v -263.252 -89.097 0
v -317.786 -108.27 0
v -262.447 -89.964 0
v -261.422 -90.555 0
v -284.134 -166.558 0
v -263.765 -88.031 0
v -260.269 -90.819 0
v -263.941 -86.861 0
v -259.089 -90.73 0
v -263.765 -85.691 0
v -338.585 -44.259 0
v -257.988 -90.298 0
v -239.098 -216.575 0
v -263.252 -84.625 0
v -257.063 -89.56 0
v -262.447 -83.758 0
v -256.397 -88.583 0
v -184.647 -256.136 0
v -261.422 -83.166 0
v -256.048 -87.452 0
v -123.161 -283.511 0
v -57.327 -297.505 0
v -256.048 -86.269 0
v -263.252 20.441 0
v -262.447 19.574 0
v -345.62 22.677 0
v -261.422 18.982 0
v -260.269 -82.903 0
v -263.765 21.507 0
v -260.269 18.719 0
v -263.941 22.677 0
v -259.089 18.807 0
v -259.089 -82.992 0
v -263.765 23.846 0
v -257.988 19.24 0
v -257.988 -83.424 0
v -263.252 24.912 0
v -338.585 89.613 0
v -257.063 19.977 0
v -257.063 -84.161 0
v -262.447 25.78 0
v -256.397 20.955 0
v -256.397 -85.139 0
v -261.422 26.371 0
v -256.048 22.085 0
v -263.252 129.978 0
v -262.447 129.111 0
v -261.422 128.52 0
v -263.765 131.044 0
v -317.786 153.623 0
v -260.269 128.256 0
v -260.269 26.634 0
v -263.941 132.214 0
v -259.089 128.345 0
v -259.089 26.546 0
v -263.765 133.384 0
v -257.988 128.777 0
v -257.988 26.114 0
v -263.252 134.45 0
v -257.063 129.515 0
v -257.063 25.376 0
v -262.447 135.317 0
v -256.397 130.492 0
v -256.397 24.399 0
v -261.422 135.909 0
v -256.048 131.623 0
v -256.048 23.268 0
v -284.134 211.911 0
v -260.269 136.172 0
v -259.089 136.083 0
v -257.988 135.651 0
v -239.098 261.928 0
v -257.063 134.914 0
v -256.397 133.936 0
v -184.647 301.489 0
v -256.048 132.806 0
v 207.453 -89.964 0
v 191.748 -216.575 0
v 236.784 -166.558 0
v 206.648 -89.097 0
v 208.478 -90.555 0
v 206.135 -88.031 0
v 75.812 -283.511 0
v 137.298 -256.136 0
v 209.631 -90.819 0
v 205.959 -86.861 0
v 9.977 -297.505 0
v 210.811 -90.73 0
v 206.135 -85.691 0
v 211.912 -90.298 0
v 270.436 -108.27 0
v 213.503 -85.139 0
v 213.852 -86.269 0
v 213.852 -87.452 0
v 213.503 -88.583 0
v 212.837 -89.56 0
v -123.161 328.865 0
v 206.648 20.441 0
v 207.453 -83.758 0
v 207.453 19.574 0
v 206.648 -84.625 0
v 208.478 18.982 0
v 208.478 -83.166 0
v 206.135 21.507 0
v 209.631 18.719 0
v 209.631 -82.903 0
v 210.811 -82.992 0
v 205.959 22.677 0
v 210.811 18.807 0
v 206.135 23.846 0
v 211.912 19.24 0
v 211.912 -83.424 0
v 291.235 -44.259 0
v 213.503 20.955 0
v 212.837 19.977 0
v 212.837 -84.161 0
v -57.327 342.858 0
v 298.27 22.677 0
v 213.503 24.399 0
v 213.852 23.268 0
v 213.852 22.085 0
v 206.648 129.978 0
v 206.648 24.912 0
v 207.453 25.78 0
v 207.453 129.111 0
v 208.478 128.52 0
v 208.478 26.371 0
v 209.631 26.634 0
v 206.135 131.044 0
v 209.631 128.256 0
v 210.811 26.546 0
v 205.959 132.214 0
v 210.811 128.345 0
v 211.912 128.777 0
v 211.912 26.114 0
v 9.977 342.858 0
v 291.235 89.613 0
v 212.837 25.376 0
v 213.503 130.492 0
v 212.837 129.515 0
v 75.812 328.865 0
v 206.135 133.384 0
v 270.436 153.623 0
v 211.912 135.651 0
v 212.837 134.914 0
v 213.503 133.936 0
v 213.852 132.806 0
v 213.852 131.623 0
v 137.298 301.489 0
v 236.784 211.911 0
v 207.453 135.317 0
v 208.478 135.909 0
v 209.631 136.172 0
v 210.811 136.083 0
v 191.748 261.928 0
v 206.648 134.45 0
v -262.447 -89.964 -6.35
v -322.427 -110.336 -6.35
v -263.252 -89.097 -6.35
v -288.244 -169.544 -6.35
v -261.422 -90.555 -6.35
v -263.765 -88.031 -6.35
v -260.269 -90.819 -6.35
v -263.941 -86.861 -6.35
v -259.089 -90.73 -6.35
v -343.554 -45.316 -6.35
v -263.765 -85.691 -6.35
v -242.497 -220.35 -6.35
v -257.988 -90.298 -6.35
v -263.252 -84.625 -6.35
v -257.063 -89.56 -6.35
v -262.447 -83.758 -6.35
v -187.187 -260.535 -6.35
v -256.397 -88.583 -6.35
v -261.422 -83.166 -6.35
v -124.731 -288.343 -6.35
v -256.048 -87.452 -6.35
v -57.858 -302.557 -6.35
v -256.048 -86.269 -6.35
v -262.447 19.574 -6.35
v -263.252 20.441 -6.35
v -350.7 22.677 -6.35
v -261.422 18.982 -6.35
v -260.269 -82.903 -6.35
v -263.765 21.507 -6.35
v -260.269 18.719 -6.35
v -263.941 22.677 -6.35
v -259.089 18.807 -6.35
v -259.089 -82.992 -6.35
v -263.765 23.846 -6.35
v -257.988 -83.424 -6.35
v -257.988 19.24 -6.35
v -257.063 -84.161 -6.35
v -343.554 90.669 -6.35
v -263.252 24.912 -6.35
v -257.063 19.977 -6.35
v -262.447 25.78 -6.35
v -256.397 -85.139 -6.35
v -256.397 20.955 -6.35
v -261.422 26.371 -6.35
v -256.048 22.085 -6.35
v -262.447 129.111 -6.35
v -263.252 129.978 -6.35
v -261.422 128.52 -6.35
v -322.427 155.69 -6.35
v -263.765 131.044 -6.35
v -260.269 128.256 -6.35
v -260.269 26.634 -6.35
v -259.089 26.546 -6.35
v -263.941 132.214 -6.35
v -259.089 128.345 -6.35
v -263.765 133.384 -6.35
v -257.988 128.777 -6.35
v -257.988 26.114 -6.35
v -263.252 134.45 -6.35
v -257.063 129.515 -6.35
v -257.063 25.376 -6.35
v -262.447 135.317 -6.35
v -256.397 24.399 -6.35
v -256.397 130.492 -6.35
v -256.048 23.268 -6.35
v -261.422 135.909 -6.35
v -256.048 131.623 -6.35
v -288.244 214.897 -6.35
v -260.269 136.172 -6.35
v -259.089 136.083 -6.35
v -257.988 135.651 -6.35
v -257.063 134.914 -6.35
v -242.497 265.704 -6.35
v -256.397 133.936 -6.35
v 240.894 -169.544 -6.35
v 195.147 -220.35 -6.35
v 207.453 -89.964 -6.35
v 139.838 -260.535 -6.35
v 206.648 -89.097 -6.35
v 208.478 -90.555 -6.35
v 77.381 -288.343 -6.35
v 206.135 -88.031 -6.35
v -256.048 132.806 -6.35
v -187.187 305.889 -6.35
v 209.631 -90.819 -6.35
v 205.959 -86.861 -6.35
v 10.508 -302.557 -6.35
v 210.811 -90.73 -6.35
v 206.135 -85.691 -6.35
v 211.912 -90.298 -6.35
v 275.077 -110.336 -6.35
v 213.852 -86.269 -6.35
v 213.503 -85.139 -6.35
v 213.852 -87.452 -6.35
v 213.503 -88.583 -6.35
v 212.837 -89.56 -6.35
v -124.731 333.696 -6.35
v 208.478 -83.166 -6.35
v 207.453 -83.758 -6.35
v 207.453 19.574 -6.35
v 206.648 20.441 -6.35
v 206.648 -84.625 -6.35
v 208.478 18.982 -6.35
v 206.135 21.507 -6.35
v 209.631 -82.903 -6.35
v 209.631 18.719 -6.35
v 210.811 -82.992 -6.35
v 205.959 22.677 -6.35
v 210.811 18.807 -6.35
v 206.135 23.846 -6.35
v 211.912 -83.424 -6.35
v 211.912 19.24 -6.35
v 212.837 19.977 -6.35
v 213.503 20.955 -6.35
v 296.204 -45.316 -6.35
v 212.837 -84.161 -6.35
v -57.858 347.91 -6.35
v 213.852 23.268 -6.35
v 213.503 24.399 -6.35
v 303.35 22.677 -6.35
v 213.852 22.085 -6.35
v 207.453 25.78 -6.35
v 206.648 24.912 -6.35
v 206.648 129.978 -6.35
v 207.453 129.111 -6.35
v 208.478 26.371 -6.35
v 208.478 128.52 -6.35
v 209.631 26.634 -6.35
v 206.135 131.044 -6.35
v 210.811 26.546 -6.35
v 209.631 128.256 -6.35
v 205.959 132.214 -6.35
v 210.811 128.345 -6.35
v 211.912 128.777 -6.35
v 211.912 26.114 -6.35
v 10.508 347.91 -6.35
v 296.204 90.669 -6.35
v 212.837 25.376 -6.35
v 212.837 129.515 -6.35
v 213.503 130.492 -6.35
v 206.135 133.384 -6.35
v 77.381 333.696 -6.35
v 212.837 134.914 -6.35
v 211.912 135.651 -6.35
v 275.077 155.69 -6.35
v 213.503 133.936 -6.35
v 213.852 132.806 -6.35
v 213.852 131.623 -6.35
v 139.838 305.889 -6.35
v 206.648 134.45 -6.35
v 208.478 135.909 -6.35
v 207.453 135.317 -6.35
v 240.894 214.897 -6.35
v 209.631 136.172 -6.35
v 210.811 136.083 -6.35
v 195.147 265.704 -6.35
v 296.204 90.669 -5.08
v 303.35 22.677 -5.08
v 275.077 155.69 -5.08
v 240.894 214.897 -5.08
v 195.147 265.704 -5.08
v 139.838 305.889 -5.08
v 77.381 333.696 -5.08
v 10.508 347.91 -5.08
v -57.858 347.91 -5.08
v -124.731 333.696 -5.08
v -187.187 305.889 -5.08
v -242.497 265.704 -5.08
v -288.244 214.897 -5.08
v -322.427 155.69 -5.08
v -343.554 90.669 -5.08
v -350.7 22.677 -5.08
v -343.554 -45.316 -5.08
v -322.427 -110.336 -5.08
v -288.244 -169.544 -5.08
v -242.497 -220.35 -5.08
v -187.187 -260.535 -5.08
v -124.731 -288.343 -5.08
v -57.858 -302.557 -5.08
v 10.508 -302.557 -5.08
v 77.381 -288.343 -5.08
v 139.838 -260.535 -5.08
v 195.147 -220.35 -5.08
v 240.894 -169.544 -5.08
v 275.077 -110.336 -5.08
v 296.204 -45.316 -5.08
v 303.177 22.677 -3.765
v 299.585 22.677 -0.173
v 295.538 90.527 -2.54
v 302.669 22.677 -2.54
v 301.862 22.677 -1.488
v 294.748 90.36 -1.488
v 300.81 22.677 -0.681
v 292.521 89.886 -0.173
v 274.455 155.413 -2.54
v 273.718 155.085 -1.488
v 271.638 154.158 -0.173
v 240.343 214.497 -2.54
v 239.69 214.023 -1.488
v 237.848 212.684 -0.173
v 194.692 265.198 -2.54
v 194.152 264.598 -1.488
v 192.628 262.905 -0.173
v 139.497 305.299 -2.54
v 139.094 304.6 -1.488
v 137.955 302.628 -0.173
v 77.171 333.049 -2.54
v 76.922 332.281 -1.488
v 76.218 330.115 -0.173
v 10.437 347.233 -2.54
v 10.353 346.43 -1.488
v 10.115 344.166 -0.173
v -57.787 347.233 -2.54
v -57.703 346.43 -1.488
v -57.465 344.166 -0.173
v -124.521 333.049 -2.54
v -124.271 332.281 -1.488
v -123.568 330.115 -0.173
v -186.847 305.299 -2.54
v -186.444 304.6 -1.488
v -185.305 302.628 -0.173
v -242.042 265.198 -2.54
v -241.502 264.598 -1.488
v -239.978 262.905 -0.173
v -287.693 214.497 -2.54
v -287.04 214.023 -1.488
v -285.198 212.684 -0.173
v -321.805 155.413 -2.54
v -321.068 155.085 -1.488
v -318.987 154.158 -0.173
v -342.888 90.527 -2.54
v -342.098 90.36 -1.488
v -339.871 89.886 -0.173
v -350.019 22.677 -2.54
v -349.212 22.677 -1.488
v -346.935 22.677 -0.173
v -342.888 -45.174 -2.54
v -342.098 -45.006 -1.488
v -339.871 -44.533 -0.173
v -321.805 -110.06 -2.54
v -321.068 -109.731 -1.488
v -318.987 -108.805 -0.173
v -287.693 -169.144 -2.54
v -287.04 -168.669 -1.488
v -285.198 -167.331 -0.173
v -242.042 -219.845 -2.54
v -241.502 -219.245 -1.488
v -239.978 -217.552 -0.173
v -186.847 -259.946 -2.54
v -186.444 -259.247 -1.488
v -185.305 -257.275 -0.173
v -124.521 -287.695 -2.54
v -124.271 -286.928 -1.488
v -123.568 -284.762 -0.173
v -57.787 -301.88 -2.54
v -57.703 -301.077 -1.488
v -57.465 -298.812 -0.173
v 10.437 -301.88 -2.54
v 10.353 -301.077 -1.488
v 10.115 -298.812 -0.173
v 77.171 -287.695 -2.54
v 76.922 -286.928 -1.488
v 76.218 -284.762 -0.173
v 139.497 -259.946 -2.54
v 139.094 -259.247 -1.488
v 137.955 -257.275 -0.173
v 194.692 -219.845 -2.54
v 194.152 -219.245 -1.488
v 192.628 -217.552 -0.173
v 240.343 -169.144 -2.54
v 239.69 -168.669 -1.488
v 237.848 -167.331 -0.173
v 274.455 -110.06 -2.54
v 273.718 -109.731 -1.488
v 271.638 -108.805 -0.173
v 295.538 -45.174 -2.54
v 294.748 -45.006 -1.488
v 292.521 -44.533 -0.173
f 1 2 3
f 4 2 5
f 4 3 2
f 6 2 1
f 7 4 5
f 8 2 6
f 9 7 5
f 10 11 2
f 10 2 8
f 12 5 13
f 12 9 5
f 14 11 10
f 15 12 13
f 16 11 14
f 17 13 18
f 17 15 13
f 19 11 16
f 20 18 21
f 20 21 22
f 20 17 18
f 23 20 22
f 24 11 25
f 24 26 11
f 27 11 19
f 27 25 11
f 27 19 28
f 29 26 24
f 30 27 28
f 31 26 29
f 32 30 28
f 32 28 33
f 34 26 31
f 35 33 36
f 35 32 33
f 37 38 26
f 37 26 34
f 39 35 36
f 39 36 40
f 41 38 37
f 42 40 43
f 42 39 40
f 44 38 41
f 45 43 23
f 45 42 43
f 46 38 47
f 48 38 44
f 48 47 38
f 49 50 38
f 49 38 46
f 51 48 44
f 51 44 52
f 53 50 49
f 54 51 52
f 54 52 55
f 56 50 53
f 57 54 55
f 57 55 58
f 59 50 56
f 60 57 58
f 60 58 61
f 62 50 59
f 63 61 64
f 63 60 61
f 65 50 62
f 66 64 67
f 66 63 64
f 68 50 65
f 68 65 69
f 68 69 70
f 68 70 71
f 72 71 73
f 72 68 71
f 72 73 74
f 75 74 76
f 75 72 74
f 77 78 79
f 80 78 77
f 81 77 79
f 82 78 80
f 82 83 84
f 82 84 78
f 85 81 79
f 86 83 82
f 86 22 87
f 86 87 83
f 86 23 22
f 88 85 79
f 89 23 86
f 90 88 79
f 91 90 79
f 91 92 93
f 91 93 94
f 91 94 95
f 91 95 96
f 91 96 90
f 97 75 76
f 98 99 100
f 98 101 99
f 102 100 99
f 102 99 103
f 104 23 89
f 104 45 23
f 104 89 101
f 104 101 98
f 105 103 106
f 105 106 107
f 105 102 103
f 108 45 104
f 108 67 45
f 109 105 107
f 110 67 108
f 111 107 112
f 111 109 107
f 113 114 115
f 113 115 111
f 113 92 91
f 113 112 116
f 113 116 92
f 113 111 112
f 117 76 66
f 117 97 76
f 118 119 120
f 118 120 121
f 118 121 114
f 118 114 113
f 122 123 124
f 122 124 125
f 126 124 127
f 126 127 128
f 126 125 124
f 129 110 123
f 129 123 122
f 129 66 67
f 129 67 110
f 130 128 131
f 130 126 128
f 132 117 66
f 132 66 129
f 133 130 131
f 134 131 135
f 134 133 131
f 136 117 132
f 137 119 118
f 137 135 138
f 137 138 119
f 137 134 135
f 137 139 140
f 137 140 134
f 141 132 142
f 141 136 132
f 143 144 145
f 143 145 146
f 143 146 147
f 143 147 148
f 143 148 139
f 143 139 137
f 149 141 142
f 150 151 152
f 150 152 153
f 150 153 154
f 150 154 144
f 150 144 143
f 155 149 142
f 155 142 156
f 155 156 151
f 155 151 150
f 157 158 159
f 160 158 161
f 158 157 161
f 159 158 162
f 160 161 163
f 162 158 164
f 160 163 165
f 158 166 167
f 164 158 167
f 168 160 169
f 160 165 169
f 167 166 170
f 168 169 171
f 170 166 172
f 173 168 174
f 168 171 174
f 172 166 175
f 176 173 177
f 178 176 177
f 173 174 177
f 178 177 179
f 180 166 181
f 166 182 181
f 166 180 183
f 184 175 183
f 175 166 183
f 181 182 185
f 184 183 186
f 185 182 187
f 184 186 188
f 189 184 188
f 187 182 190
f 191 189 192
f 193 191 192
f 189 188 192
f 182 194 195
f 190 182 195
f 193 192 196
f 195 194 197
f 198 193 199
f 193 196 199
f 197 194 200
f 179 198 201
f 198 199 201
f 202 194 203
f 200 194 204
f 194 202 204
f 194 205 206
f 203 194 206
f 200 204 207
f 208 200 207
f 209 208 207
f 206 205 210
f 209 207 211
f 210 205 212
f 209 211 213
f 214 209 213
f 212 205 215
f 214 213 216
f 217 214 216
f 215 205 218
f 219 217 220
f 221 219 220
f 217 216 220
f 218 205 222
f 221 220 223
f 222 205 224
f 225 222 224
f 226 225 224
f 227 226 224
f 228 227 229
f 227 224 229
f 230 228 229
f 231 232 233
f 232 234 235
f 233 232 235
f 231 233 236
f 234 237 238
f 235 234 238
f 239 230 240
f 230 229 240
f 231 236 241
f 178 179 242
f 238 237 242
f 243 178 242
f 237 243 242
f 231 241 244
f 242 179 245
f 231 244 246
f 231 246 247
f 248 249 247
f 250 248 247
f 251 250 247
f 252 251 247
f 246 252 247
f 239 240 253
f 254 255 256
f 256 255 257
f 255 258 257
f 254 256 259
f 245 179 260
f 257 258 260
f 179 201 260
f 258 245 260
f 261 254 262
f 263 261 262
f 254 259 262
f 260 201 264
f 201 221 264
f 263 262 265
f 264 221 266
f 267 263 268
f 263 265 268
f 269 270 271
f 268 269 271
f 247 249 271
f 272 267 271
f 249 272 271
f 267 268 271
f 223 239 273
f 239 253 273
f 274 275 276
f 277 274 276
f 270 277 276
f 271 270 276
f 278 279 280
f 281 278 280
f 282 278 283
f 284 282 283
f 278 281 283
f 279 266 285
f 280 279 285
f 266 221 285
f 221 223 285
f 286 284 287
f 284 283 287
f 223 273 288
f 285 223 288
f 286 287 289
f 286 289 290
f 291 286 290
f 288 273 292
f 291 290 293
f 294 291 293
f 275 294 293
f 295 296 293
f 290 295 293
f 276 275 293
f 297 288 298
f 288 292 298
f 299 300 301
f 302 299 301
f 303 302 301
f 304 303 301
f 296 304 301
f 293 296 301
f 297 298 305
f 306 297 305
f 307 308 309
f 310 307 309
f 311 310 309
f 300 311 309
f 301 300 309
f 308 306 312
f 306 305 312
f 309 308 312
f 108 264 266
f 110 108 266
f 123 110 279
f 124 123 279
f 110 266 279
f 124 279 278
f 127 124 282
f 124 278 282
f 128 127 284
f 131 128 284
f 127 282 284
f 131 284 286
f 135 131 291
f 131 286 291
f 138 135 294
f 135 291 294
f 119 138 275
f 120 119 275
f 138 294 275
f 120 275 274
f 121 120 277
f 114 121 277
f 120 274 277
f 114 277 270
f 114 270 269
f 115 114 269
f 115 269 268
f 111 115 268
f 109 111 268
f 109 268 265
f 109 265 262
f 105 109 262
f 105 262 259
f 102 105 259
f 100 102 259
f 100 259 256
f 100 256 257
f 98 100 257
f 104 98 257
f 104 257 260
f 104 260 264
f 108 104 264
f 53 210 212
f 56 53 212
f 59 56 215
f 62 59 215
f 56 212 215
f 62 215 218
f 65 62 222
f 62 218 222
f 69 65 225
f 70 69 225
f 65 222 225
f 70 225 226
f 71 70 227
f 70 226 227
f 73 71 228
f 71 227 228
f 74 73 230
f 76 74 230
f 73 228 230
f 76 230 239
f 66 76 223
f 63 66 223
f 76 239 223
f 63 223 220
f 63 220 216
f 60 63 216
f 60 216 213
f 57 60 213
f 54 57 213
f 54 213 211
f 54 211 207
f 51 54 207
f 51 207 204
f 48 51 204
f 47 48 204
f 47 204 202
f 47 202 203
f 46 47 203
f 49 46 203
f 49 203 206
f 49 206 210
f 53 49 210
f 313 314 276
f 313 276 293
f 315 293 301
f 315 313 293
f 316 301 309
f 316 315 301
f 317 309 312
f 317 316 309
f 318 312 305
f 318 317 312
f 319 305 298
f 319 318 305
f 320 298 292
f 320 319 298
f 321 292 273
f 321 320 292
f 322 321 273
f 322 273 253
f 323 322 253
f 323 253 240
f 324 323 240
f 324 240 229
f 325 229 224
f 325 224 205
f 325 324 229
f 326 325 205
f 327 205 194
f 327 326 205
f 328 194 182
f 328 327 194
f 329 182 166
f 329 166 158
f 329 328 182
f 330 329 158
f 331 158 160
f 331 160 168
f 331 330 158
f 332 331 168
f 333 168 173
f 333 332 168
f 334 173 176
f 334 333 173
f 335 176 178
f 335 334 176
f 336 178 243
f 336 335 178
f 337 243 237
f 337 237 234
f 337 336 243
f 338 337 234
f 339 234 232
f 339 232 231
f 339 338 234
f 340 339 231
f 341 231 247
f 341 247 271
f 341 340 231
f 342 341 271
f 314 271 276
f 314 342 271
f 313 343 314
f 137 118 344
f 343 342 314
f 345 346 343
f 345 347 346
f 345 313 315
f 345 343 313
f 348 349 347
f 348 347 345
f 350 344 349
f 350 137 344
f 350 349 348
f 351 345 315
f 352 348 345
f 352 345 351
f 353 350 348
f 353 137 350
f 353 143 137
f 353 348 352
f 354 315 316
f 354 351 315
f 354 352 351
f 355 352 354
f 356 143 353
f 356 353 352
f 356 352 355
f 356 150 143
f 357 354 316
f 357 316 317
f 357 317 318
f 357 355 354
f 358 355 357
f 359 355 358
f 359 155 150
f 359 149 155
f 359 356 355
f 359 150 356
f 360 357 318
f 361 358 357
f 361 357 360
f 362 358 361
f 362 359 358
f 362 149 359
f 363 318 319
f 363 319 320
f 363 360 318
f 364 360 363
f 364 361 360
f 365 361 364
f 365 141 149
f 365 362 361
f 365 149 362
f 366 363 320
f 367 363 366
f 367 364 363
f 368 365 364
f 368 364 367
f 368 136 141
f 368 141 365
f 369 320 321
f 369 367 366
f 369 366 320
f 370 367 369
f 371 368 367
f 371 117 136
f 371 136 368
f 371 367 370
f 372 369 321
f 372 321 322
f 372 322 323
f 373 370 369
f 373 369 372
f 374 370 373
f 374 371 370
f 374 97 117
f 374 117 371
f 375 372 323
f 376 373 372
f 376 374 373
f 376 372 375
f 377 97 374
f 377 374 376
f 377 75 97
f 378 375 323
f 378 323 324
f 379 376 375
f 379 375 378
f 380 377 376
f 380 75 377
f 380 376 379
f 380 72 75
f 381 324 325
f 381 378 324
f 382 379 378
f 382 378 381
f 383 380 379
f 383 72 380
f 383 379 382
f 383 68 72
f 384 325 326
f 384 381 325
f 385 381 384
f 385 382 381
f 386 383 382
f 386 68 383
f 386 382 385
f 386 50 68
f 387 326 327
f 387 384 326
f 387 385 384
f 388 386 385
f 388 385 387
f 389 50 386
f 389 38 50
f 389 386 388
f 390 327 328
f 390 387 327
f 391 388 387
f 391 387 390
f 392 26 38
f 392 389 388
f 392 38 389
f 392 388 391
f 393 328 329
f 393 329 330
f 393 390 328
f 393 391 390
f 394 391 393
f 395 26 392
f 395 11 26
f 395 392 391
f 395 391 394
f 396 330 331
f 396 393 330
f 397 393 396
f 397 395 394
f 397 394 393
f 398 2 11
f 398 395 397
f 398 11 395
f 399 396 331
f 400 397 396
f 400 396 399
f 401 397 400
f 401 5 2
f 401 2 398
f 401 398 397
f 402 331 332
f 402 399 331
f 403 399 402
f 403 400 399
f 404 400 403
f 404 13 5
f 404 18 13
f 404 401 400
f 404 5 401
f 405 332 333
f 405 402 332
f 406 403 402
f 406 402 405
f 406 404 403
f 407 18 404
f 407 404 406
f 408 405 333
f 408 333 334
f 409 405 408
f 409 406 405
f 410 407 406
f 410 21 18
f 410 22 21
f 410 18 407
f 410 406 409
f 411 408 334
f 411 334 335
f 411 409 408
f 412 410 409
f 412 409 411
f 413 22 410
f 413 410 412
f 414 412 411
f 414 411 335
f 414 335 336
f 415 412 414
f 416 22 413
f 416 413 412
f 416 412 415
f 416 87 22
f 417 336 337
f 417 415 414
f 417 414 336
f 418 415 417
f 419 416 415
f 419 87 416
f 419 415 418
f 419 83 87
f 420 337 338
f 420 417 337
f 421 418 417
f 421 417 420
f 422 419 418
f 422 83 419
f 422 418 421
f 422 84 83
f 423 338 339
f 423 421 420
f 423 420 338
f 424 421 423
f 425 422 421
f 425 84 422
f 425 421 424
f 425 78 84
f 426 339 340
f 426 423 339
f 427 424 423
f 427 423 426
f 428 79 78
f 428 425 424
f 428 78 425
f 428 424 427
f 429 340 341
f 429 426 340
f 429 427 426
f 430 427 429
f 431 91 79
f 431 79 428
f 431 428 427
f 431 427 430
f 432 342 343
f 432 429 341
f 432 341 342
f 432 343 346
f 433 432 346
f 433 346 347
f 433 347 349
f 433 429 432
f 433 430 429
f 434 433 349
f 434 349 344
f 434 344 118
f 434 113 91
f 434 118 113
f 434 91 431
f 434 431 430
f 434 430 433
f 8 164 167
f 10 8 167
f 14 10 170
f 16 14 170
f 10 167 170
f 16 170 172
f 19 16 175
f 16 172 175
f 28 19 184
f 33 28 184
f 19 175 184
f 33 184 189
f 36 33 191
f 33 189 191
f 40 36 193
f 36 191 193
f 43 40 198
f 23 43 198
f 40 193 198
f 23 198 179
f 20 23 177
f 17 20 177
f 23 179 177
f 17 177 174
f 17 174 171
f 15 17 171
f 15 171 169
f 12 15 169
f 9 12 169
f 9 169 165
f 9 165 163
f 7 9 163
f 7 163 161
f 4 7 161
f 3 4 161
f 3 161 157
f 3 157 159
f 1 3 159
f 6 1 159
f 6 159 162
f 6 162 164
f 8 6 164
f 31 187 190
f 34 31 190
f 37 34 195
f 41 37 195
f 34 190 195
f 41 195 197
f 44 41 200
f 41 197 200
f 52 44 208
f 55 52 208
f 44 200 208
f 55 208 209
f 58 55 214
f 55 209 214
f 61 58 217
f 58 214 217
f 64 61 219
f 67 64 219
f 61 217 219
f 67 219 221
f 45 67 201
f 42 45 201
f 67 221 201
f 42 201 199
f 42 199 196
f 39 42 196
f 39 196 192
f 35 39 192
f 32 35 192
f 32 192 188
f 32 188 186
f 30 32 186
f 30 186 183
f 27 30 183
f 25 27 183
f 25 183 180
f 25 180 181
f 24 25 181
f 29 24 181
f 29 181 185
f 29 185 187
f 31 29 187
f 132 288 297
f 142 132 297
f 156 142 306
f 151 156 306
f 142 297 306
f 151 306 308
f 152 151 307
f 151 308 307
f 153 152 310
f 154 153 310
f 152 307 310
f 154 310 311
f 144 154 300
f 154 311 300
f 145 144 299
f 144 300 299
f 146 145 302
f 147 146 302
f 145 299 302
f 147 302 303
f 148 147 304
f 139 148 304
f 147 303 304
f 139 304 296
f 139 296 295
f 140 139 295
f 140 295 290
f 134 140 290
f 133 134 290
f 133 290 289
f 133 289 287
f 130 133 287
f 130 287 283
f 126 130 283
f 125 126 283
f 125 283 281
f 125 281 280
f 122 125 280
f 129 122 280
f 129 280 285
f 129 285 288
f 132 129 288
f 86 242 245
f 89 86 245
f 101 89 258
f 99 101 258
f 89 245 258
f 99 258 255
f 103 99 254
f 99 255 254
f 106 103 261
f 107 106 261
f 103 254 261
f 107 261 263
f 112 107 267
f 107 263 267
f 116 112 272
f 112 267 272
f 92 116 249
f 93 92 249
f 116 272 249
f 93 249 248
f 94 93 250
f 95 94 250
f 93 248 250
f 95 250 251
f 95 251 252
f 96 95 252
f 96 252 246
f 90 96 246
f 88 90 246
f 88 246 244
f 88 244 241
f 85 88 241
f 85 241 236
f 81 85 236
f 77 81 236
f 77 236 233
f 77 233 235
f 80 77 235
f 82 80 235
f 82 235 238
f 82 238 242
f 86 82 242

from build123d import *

# Parameters (mm, degrees)
F0_R     = 327.025
F1_DEPTH = 6.35
F3_D     = 7.9375
F5_D     = 7.9375
F6_R     = 5.08


with BuildPart() as f1:
    # F0 (on Top) → F1 (new body)
    with BuildSketch(Plane.XY):
        with Locations((-23.674974, 22.676632)):
            Circle(F0_R)
    extrude(amount=-F1_DEPTH)

    # F3 (through all)
    with Locations(Plane.XY):
        with Locations((-259.972523, 22.676632), (209.927477, 22.676632)):
            Hole(F3_D / 2)

    # F5 (through all)
    with Locations(Plane.XY):
        with Locations((-259.972523, 132.214132), (-259.972523, -86.860868), (209.927477, -86.860868), (209.927477, 132.214132)):
            Hole(F5_D / 2)

    # F6
    f6_edges = [f1.edges().sort_by_distance(p)[0] for p in [
        (-350.699974, 22.676632, 0),
    ]]
    fillet(f6_edges, radius=F6_R)


solid = f1.part
